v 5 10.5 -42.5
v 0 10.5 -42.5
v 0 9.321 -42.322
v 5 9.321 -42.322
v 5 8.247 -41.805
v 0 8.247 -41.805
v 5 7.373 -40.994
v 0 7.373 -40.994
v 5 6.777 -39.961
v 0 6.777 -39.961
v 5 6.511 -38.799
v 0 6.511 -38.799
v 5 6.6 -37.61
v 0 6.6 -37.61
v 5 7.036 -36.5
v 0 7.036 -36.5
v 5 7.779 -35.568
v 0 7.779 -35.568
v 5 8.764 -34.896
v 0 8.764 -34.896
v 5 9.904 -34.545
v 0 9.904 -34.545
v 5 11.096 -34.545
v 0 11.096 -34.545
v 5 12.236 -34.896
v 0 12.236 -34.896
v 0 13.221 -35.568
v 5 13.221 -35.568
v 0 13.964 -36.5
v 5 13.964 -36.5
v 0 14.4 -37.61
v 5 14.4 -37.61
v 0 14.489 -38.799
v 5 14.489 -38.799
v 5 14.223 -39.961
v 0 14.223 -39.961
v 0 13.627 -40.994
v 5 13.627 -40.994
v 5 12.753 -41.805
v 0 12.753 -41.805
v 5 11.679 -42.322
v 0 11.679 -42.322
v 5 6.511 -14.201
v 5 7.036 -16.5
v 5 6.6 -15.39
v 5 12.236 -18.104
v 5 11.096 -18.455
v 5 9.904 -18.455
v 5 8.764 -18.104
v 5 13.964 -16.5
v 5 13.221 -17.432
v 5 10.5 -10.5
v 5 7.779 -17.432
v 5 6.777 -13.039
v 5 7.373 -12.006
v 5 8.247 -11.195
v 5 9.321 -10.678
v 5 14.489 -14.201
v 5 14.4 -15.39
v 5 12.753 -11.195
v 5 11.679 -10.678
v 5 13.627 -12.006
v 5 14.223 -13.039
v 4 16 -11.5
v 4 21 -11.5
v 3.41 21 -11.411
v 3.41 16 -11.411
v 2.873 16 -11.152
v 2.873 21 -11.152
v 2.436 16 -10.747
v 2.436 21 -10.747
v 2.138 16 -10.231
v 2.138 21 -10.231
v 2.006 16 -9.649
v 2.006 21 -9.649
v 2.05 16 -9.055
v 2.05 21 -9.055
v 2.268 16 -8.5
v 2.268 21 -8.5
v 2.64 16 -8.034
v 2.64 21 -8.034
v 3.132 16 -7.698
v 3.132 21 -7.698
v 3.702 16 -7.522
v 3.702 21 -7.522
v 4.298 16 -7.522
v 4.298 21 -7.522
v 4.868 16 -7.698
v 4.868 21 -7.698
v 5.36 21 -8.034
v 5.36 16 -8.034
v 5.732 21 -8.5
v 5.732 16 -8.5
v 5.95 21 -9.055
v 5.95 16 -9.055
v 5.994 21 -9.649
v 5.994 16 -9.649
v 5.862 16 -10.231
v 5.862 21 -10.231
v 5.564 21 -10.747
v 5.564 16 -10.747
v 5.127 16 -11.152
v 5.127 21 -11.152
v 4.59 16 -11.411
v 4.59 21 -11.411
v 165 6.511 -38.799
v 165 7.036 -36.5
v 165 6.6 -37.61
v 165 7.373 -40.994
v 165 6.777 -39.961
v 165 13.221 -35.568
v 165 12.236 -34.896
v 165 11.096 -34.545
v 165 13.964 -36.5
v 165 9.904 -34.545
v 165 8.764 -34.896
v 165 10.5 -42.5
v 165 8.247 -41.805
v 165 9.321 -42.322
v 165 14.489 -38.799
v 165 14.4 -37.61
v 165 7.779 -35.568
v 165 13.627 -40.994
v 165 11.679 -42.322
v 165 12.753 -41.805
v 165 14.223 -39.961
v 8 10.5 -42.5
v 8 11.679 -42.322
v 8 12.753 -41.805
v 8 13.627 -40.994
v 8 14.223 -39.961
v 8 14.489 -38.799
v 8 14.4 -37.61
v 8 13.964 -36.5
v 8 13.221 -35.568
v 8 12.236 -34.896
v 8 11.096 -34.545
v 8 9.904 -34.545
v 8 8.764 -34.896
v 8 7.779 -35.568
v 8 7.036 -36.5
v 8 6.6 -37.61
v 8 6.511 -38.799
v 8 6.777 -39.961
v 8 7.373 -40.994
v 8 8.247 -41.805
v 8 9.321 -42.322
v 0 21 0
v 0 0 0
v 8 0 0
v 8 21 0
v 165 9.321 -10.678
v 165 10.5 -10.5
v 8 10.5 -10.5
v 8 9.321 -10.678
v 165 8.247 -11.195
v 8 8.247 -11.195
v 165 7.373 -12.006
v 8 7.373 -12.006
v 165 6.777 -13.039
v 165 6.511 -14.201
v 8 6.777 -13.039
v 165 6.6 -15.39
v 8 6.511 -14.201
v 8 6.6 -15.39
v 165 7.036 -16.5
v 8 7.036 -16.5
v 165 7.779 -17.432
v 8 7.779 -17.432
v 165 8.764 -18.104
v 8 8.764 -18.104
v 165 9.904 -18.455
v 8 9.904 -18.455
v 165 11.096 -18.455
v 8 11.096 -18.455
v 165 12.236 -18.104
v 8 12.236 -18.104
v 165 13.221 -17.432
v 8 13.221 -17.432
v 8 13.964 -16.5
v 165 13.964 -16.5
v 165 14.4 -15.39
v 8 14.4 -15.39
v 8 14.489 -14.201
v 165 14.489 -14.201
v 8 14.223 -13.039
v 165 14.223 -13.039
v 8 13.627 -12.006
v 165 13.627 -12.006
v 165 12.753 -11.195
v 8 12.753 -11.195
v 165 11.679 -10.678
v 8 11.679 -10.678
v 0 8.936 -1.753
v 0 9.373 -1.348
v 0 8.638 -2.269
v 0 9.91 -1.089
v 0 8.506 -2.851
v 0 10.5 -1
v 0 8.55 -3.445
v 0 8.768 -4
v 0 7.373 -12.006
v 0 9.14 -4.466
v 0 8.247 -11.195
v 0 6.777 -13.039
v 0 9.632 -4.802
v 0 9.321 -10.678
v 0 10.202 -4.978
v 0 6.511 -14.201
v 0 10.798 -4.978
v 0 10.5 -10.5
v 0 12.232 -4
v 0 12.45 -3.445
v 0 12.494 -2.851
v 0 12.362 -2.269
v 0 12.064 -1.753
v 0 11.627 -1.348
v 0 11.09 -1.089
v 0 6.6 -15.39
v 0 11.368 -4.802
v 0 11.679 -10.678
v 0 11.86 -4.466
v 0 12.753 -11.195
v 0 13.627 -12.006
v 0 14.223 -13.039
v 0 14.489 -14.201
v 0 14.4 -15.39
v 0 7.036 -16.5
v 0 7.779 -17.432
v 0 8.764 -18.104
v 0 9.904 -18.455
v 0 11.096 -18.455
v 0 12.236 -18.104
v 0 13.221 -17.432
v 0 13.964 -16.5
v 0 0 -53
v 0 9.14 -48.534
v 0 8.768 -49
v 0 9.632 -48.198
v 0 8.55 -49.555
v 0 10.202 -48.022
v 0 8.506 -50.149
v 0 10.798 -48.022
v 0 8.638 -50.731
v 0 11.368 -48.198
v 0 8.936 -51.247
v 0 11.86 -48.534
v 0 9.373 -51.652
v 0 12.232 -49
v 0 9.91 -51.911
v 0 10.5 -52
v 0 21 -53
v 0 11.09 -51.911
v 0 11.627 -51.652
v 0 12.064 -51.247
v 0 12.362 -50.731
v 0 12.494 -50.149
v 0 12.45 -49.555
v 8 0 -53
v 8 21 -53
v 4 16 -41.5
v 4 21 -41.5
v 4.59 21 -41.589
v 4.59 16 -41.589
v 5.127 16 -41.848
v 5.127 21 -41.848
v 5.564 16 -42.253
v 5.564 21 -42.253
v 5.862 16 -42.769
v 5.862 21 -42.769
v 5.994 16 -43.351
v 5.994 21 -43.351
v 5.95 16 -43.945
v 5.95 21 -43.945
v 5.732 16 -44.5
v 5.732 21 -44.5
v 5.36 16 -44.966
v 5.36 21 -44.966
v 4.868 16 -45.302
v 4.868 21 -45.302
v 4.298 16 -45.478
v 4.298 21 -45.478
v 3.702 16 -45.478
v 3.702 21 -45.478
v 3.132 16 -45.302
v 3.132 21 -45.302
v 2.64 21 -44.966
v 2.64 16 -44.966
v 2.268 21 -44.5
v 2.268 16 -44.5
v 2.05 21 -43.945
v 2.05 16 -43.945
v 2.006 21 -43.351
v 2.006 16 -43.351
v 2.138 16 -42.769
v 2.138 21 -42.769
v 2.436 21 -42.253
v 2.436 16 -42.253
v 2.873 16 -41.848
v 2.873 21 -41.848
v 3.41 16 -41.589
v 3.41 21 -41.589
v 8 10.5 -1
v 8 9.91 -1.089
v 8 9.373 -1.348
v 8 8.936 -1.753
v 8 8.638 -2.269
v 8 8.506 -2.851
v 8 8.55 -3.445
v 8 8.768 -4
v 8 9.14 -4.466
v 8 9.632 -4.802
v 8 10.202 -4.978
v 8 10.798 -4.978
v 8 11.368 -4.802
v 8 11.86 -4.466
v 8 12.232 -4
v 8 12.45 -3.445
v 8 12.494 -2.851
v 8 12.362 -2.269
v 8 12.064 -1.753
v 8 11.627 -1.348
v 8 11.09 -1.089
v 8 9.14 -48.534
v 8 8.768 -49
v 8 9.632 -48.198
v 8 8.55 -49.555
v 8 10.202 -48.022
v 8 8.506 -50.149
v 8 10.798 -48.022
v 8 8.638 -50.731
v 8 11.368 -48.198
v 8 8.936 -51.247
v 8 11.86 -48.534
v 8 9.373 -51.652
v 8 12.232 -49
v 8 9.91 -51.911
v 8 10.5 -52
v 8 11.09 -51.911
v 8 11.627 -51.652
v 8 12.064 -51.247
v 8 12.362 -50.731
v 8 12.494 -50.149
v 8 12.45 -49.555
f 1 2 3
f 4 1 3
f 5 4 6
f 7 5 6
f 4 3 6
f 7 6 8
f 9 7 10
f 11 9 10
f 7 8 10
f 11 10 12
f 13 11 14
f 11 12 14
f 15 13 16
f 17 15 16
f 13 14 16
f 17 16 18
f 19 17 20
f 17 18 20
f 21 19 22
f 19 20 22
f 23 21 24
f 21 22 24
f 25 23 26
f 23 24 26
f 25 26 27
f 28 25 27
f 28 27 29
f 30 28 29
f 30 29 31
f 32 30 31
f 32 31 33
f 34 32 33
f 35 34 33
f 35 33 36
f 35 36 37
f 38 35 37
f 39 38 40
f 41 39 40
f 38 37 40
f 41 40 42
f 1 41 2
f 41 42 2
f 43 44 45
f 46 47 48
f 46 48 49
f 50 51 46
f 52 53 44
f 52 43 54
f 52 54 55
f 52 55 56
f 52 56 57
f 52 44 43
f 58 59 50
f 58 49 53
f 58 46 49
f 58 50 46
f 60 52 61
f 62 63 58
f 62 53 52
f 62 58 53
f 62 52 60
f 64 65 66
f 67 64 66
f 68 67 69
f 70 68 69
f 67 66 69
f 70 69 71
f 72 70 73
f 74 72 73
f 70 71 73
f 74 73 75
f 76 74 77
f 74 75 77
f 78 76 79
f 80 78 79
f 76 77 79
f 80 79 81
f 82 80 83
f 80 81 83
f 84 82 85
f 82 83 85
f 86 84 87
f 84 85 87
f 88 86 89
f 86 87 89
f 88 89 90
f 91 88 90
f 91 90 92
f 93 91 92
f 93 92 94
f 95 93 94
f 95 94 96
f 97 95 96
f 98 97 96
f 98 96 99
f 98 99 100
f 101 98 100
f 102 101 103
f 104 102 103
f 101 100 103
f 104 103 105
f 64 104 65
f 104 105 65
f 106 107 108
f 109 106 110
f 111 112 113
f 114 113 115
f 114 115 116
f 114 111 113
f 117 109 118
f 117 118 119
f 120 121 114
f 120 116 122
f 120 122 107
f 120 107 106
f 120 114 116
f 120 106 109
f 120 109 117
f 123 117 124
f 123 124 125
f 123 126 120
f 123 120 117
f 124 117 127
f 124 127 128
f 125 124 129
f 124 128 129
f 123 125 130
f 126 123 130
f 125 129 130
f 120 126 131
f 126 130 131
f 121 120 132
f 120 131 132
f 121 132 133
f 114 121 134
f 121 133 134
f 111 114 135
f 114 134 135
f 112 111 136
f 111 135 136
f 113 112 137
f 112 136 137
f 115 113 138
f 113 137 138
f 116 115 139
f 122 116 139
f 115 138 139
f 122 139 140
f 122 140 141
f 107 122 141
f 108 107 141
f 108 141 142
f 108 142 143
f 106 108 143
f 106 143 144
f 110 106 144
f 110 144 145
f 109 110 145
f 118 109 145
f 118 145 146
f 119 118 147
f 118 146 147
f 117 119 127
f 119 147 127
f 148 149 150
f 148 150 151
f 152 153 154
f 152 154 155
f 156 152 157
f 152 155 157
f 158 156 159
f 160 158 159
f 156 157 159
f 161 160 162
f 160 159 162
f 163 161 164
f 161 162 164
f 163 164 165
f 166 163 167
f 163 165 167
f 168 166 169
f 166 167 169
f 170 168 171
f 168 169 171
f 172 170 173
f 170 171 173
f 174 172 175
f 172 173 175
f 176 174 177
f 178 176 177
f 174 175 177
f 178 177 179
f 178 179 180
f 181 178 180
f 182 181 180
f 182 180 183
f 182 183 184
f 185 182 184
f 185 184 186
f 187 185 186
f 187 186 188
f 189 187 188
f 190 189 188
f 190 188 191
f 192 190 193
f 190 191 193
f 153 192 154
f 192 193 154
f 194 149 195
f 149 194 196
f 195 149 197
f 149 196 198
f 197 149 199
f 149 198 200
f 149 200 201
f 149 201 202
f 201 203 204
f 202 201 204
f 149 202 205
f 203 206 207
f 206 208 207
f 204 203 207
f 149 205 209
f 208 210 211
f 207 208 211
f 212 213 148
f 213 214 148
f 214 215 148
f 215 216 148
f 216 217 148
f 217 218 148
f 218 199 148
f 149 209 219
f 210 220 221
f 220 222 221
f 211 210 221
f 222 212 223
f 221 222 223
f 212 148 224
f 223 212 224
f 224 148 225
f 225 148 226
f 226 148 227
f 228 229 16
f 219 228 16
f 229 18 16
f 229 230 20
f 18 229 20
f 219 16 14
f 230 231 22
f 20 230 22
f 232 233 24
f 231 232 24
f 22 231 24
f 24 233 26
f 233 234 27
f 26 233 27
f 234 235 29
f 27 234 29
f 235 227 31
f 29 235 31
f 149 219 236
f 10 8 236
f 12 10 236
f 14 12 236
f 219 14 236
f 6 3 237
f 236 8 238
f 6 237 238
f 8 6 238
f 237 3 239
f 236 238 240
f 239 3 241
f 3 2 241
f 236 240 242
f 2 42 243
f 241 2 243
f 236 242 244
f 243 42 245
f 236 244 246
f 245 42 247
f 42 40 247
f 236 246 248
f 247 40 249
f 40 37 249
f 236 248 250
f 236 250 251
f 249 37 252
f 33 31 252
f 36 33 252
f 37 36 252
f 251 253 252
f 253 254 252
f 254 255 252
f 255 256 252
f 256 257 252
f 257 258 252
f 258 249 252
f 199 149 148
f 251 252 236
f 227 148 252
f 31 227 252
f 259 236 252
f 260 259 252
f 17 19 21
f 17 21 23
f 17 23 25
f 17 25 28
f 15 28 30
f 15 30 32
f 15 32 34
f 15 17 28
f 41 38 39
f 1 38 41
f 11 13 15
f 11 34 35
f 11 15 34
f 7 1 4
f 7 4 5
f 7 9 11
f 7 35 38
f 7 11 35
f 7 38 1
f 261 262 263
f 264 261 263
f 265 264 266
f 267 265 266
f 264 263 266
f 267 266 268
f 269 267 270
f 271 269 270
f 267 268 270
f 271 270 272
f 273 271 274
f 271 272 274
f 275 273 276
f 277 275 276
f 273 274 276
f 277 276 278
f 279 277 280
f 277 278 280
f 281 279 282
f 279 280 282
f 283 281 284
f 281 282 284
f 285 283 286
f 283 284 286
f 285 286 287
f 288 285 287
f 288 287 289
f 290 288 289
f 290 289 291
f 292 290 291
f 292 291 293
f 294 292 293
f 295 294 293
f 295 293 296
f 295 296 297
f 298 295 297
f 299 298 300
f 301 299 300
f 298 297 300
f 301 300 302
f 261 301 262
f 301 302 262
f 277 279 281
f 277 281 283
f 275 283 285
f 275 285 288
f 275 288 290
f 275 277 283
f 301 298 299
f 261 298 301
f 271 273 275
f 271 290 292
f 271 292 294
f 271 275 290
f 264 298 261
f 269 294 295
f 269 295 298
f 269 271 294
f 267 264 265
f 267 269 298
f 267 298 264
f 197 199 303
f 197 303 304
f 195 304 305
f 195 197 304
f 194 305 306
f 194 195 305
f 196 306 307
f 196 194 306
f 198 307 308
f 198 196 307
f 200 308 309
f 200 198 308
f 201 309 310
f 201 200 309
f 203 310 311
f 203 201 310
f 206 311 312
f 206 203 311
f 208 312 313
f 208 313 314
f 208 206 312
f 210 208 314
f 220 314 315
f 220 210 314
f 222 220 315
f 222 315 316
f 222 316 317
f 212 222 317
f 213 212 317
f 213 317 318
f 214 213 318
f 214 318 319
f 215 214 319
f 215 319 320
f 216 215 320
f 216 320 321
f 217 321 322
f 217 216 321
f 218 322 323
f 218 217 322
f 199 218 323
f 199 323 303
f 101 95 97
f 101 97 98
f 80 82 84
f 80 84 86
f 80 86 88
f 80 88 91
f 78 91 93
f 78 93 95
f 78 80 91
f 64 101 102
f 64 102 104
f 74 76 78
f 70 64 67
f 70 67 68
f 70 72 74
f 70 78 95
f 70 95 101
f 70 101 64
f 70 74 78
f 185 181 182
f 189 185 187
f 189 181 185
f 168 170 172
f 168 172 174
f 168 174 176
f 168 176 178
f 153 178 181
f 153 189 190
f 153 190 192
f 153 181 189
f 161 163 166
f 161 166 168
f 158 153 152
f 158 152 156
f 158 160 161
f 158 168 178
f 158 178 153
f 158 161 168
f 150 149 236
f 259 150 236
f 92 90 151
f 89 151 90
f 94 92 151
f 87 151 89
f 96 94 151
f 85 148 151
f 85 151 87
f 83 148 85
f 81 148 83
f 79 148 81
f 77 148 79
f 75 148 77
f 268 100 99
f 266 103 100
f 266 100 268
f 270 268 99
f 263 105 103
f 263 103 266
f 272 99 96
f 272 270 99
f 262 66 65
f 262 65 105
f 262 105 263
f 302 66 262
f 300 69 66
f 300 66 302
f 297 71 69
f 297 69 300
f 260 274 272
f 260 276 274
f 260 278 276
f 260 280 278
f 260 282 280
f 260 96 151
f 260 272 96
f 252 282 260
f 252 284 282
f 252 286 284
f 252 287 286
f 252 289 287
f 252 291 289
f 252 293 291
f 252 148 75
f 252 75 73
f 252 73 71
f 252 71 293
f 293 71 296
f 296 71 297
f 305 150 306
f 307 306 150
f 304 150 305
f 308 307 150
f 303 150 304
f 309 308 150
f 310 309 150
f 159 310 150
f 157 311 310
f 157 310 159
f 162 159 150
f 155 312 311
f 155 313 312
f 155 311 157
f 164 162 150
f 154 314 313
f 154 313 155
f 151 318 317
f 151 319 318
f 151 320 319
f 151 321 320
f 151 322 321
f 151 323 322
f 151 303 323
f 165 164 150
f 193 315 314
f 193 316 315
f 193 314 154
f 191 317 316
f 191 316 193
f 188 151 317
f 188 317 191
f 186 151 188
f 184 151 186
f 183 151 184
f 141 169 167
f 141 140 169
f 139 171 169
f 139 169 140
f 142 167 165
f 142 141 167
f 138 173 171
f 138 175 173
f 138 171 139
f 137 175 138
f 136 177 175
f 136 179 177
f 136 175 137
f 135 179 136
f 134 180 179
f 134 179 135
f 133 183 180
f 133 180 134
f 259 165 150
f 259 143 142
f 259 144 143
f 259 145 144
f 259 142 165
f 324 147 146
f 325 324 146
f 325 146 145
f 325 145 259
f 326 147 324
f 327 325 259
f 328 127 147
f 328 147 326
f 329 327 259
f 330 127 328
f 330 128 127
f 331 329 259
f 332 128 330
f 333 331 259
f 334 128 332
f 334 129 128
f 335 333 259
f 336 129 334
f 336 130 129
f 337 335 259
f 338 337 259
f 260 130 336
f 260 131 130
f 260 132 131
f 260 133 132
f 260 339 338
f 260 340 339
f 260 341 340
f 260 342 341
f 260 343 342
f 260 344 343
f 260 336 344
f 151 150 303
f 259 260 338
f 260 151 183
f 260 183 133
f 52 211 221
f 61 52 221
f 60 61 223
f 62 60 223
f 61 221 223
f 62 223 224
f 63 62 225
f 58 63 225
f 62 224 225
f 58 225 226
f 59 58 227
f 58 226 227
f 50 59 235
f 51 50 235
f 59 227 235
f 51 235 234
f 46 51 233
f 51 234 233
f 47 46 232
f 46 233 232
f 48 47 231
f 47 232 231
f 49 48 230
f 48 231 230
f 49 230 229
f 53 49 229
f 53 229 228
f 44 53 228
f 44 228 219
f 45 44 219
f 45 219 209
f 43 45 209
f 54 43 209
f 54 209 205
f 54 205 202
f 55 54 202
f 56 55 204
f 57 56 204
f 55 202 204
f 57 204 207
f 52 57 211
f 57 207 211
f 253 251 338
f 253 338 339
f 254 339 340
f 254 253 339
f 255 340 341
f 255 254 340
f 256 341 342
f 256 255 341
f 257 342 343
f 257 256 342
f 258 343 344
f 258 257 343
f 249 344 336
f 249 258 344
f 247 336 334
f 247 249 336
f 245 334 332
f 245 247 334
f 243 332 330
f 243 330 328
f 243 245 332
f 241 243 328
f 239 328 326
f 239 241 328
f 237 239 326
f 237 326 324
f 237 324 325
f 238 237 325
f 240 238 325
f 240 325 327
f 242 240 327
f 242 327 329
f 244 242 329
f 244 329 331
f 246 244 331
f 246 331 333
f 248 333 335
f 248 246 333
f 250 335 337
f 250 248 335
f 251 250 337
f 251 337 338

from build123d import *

# Parameters (mm, degrees)
SKETCH_1_W          = 53
SKETCH_1_H          = 21
SKETCH_1_R          = 2
EXTRUDE_1_DEPTH     = 8
SKETCH_2_R          = 4
CUT_EXTRUDE_1_DEPTH = 5
SKETCH_3_R          = 4
EXTRUDE_2_DEPTH     = 157
SKETCH_4_R          = 2
CUT_EXTRUDE_2_DEPTH = 5


with BuildPart() as part:
    # 草图1 → 凸台-拉伸1 (new body)
    with BuildSketch(Plane(origin=(0, 0, 0), x_dir=(0, 0, -1), z_dir=(1, 0, 0))):
        with Locations((26.5, 10.5)):
            Rectangle(SKETCH_1_W, SKETCH_1_H)
        with Locations((50, 10.5)):
            Circle(SKETCH_1_R, mode=Mode.SUBTRACT)
        with Locations(Location((3, 10.5, 0), (0, 0, 180))):
            Circle(SKETCH_1_R, mode=Mode.SUBTRACT)
    extrude(amount=EXTRUDE_1_DEPTH)

    # 草图2 → 切除-拉伸1 (cut)
    with BuildSketch(Plane.ZY):
        with Locations((-14.5, 10.5)):
            Circle(SKETCH_2_R)
        with Locations(Location((-38.5, 10.5, 0), (0, 0, 180))):
            Circle(SKETCH_2_R)
    extrude(amount=-CUT_EXTRUDE_1_DEPTH, mode=Mode.SUBTRACT)

    # 草图3 → 凸台-拉伸2 (add)
    with BuildSketch(Plane(origin=(8, 0, 0), x_dir=(0, 0, -1), z_dir=(1, 0, 0))):
        with Locations((38.5, 10.5)):
            Circle(SKETCH_3_R)
        with Locations(Location((14.5, 10.5, 0), (0, 0, 180))):
            Circle(SKETCH_3_R)
    extrude(amount=EXTRUDE_2_DEPTH)

    # 草图4 → 切除-拉伸2 (cut)
    with BuildSketch(Plane(origin=(0, 21, 0), x_dir=(1, 0, 0), z_dir=(0, 1, 0))):
        with Locations(Location((4, 43.5, 0), (0, 0, 270))):
            Circle(SKETCH_4_R)
        with Locations(Location((4, 9.5, 0), (0, 0, 90))):
            Circle(SKETCH_4_R)
    extrude(amount=-CUT_EXTRUDE_2_DEPTH, mode=Mode.SUBTRACT)


solid = part.part
